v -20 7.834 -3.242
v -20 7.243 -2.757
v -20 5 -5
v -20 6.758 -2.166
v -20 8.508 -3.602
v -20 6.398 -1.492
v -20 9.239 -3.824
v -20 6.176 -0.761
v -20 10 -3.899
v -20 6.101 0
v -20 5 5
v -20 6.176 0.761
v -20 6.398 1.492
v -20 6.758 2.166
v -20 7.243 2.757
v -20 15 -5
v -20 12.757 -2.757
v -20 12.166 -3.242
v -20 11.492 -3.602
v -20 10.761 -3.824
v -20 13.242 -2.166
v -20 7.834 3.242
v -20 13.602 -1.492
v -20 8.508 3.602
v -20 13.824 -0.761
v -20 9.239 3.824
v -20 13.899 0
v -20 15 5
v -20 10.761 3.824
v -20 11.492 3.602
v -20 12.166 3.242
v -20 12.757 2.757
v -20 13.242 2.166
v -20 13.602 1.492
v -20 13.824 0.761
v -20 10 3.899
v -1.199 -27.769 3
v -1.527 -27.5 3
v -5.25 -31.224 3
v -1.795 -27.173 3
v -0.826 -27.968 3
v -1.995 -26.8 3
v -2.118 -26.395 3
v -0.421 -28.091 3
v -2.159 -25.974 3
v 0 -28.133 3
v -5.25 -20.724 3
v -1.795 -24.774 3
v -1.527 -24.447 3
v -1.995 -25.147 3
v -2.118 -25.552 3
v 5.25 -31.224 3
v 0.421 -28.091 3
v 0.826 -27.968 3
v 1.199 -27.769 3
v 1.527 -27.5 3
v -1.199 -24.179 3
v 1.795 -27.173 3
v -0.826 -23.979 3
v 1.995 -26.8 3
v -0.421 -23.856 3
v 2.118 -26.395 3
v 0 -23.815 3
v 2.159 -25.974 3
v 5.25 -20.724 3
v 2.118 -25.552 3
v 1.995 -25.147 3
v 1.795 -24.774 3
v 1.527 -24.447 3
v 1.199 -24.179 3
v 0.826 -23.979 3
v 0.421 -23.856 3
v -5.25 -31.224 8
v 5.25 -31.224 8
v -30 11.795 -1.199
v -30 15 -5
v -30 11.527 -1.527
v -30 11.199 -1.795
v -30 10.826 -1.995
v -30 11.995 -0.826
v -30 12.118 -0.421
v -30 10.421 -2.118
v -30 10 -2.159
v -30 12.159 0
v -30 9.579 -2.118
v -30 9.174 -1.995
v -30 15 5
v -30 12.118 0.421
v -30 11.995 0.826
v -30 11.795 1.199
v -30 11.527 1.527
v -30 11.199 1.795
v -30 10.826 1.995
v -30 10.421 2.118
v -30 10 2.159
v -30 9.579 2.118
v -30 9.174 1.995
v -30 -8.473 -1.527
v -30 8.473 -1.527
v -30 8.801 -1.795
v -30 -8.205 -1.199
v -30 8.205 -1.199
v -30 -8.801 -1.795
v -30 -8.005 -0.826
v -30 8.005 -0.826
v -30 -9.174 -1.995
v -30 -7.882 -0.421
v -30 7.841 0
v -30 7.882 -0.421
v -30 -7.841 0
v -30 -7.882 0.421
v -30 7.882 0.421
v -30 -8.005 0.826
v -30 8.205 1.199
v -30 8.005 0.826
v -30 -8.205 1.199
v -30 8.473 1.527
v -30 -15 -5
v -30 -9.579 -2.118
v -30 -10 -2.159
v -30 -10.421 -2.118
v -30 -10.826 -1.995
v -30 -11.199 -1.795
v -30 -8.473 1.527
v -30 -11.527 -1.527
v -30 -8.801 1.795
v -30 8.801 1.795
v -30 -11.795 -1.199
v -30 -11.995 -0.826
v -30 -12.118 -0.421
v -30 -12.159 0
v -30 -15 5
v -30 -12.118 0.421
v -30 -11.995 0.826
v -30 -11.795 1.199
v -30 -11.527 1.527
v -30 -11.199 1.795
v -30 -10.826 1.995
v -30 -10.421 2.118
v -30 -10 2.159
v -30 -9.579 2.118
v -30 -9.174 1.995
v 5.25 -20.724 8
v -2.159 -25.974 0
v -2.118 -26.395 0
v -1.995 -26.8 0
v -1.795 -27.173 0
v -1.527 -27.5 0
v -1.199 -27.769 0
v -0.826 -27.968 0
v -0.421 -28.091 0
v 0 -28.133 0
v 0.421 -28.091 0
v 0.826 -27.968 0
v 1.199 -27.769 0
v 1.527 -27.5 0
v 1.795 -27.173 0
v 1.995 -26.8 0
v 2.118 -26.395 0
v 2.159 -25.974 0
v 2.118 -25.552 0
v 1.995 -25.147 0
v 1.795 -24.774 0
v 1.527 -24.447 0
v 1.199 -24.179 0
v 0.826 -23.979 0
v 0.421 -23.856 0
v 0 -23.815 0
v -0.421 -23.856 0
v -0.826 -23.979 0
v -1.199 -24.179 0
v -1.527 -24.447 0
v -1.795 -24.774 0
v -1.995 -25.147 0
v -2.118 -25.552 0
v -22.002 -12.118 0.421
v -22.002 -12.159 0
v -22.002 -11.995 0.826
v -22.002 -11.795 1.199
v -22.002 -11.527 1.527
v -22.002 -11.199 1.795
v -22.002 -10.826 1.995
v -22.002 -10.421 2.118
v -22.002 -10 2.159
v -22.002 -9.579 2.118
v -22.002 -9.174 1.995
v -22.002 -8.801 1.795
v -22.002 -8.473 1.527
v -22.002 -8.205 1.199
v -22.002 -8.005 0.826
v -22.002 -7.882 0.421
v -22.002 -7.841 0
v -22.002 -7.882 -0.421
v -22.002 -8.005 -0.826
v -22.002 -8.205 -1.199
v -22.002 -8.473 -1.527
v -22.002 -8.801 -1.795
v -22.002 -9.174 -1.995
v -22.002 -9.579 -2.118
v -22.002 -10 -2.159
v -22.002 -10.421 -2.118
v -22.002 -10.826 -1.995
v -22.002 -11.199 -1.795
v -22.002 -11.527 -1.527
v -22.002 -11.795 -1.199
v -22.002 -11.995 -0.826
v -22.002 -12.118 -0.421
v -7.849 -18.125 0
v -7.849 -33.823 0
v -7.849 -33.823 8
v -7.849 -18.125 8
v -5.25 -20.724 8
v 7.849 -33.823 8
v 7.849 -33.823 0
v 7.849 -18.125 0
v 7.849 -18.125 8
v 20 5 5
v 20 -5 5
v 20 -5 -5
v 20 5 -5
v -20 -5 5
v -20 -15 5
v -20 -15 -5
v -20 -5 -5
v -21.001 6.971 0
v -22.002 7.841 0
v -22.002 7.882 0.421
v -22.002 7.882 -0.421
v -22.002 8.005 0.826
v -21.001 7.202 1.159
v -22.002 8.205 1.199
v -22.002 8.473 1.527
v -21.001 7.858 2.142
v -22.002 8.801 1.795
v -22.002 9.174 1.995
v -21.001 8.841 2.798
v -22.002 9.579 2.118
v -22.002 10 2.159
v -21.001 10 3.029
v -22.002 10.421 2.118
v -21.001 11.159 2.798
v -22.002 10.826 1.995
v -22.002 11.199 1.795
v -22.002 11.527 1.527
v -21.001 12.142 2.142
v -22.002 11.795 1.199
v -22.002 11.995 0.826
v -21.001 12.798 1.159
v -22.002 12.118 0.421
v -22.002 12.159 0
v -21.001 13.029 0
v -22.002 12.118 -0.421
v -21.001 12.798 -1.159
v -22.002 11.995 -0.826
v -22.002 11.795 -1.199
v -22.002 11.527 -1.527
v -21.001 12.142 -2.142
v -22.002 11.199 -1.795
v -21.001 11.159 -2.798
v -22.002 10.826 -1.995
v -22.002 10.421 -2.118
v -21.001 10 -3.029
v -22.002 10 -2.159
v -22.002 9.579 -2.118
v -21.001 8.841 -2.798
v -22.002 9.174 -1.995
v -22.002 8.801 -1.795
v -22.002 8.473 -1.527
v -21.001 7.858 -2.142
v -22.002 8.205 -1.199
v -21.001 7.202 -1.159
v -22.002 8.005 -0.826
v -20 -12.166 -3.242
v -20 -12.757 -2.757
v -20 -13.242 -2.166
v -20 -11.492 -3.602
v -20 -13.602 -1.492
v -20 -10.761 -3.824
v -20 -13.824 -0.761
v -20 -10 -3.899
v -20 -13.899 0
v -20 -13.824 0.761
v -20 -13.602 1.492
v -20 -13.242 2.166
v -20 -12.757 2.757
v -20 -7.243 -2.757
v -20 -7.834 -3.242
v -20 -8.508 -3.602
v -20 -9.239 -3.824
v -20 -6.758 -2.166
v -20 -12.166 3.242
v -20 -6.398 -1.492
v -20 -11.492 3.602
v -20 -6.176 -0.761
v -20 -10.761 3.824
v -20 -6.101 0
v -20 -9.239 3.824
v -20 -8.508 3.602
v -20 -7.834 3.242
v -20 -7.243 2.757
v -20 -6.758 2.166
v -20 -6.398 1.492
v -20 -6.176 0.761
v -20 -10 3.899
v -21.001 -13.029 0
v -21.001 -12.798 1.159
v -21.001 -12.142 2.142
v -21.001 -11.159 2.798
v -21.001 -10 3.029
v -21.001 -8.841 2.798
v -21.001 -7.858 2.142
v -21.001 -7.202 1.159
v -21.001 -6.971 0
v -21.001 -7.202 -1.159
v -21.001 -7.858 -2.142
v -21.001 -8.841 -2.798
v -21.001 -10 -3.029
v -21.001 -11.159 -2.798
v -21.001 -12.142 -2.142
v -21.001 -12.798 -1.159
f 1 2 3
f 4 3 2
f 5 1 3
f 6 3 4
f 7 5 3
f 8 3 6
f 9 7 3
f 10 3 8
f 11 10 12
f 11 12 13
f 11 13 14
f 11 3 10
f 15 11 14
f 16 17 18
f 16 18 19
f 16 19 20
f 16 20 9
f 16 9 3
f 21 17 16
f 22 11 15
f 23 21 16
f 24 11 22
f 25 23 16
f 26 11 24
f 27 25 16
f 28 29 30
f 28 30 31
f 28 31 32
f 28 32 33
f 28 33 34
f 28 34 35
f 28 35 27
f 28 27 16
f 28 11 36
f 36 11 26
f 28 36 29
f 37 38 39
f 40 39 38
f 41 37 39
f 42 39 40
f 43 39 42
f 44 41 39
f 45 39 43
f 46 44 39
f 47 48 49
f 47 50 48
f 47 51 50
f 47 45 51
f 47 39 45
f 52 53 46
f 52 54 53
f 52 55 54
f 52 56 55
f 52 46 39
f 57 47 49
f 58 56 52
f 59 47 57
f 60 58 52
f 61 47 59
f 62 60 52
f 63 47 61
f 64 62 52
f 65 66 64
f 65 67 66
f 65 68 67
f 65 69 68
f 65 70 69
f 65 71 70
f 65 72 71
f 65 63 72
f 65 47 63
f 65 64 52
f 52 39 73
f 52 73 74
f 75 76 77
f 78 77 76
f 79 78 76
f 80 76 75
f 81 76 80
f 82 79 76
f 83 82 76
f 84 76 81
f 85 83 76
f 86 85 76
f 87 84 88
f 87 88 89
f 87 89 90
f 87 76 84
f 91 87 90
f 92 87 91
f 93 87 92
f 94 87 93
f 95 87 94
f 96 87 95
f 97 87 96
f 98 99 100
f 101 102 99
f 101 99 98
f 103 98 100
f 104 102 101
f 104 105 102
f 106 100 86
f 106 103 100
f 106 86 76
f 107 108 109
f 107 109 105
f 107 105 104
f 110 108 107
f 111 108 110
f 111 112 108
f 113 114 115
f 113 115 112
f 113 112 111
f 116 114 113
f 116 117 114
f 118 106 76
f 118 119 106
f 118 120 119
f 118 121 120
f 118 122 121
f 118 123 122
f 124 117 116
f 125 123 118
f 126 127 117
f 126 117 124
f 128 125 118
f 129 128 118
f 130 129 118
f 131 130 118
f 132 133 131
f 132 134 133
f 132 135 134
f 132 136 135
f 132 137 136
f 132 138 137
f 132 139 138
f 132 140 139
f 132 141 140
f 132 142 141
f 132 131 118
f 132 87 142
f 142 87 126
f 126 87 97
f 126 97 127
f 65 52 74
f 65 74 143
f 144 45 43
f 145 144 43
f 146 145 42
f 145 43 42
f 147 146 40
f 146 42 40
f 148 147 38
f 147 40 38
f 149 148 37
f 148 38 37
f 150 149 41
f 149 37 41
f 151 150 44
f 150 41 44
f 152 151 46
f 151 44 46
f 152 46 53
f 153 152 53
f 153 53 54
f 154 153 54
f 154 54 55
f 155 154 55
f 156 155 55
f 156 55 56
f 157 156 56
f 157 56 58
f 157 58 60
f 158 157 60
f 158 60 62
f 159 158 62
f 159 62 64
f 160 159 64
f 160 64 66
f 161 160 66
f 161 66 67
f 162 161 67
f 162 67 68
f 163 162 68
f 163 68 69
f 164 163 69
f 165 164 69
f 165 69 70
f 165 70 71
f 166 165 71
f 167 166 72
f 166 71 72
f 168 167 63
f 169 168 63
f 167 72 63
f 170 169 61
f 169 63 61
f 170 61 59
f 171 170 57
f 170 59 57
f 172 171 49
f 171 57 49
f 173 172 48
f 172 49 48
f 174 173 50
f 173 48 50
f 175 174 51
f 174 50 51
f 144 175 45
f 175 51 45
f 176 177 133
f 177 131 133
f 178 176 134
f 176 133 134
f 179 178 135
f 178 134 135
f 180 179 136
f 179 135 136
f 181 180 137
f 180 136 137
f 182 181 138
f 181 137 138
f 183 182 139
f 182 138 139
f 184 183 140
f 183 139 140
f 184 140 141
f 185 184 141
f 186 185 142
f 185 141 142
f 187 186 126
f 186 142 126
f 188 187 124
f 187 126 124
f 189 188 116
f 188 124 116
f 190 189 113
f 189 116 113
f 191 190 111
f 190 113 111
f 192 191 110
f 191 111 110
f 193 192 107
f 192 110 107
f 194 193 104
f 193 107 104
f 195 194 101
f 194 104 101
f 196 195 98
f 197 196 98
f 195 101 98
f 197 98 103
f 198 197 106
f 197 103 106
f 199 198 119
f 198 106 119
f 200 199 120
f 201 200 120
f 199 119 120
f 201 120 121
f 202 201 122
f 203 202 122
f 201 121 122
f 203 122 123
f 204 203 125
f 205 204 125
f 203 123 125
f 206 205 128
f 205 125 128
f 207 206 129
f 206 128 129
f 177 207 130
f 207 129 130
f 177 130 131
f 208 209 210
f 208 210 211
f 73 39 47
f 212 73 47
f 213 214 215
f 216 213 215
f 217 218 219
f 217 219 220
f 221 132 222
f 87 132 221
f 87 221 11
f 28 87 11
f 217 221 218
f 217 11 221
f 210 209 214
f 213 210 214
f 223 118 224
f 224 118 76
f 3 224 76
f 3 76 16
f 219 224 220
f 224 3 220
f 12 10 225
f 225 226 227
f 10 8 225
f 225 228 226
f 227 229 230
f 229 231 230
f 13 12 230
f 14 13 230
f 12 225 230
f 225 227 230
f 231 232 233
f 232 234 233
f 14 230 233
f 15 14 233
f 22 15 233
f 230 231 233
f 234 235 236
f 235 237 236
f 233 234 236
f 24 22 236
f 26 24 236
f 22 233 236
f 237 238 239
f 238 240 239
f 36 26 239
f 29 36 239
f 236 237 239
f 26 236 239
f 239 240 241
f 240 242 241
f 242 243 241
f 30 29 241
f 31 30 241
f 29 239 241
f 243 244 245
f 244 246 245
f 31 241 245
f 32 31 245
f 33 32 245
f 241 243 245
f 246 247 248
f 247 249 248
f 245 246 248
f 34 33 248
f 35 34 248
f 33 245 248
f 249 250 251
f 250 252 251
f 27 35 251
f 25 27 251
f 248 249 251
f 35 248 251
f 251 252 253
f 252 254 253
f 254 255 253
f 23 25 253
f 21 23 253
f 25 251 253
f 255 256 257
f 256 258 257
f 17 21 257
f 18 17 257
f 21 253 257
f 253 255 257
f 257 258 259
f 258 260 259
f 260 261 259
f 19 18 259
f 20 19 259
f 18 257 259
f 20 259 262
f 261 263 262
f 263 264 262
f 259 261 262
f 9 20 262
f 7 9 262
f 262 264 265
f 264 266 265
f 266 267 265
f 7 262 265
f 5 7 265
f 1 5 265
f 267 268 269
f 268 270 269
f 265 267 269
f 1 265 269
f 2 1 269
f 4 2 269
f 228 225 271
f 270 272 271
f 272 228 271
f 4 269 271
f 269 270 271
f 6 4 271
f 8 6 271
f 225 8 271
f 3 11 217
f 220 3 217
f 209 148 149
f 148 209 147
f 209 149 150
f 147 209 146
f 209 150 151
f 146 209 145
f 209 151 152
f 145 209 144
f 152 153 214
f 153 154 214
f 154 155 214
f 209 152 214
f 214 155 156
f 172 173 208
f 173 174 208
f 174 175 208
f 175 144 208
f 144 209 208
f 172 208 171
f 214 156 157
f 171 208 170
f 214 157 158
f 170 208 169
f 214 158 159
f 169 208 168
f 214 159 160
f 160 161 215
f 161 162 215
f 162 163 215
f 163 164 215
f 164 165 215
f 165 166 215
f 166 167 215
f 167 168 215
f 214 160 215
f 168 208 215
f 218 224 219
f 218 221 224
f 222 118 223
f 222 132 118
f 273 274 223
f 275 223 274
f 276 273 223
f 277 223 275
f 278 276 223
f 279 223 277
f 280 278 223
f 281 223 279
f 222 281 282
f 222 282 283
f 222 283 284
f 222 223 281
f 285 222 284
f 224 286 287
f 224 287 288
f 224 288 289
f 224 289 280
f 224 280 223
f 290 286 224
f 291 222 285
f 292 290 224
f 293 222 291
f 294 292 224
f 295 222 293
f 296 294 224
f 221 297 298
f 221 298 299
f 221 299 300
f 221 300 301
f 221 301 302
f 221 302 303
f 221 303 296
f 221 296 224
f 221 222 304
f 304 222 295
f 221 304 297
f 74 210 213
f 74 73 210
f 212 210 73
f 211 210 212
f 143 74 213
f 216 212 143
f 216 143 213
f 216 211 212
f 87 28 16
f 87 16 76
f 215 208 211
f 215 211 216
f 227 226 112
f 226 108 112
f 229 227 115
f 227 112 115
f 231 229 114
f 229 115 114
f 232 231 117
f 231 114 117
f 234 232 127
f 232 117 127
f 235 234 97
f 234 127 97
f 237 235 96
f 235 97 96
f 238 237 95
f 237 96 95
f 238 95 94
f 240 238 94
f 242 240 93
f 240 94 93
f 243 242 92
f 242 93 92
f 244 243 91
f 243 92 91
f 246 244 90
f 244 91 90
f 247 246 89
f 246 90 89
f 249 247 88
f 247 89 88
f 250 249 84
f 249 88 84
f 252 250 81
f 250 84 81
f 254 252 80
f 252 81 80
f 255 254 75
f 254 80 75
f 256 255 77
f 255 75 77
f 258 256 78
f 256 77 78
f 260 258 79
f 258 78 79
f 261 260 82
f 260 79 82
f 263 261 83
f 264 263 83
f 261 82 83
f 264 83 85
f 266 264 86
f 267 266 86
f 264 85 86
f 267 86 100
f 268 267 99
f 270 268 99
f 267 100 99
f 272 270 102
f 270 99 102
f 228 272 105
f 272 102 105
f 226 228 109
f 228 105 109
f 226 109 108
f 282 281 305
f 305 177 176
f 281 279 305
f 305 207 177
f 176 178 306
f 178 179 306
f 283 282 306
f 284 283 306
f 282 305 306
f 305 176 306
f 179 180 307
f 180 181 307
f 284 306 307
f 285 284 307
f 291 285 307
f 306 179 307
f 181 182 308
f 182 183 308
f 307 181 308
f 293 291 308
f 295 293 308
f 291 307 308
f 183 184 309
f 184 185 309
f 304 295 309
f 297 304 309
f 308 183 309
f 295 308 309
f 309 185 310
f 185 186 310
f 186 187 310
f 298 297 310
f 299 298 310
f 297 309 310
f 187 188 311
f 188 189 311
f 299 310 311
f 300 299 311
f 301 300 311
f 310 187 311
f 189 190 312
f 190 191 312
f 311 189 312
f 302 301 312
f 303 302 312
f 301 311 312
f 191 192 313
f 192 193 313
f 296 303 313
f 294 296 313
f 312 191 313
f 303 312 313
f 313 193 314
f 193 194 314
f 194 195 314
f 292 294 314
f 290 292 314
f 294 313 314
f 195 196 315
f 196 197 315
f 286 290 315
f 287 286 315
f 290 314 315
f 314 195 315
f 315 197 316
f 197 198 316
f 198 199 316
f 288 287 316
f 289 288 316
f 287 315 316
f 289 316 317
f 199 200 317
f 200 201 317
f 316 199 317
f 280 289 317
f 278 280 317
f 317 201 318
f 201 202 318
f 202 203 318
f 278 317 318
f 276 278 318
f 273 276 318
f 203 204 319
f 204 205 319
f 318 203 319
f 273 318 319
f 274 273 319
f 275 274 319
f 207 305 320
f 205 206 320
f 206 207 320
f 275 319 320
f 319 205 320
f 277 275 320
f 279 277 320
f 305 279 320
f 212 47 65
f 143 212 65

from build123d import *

# Parameters (mm, degrees)
F0_W           = 40
F0_H           = 10
F1_DEPTH       = 5
F3_D           = 4.318
F3_DEPTH       = 10
F3_CSINK_D     = 7.7978
F3_CSINK_ANGLE = 82
F3_TIP         = 1.2972580765
F5_D           = 4.318
F5_DEPTH       = 10
F5_CSINK_D     = 7.7978
F5_CSINK_ANGLE = 82
F5_TIP         = 1.2972580765
F6_W           = 10.5
F6_H           = 10.5
F7_DEPTH       = 3
F8_D           = 4.318
F8_DEPTH       = 4
F8_TIP         = 1.2972580765
F6_W_2         = 15.698019802
F6_H_2         = 15.698019802
F9_DEPTH       = 8


with BuildPart() as f1:
    # F0 (on Top) → F1 (new body, symmetric)
    with BuildSketch(Plane.XY):
        Rectangle(F0_W, F0_H)
        Polygon((-20, -5), (-20, 5), (-20, 15), (-30, 15), (-30, -15), (-20, -15), align=None)
    extrude(amount=F1_DEPTH, both=True)

    # F3
    with Locations(Plane.YZ.offset(-20)):
        with Locations((10, 0)):
            CounterSinkHole(F3_D / 2, F3_CSINK_D / 2, depth=F3_DEPTH, counter_sink_angle=F3_CSINK_ANGLE)
            with Locations((0, 0, -(F3_DEPTH + F3_TIP / 2))):  # 118° drill point
                Cone(0, F3_D / 2, F3_TIP, mode=Mode.SUBTRACT)

    # F5
    with Locations(Plane.YZ.offset(-20)):
        with Locations((-10, 0)):
            CounterSinkHole(F5_D / 2, F5_CSINK_D / 2, depth=F5_DEPTH, counter_sink_angle=F5_CSINK_ANGLE)
            with Locations((0, 0, -(F5_DEPTH + F5_TIP / 2))):  # 118° drill point
                Cone(0, F5_D / 2, F5_TIP, mode=Mode.SUBTRACT)


with BuildPart() as f7:
    # F6 (on Top) → F7 (new body)
    with BuildSketch(Plane.XY):
        with Locations((0, -25.9736826611)):
            Rectangle(F6_W, F6_H)
    extrude(amount=F7_DEPTH)

    # F8
    with Locations(Plane(origin=(0, 0, 0), x_dir=(1, 0, 0), z_dir=(0, 0, -1))):
        with Locations((0, 25.9736826611)):
            Hole(F8_D / 2, depth=F8_DEPTH)
            with Locations((0, 0, -(F8_DEPTH + F8_TIP / 2))):  # 118° drill point
                Cone(0, F8_D / 2, F8_TIP, mode=Mode.SUBTRACT)

    # F6 (on Top) → F9 (join)
    with BuildSketch(Plane.XY):
        with Locations((0, -25.9736826611)):
            Rectangle(F6_W_2, F6_H_2)
        with Locations((0, -25.9736826611)):
            Rectangle(F6_W, F6_H, mode=Mode.SUBTRACT)
    extrude(amount=F9_DEPTH)


solid = Compound([f1.part, f7.part])
